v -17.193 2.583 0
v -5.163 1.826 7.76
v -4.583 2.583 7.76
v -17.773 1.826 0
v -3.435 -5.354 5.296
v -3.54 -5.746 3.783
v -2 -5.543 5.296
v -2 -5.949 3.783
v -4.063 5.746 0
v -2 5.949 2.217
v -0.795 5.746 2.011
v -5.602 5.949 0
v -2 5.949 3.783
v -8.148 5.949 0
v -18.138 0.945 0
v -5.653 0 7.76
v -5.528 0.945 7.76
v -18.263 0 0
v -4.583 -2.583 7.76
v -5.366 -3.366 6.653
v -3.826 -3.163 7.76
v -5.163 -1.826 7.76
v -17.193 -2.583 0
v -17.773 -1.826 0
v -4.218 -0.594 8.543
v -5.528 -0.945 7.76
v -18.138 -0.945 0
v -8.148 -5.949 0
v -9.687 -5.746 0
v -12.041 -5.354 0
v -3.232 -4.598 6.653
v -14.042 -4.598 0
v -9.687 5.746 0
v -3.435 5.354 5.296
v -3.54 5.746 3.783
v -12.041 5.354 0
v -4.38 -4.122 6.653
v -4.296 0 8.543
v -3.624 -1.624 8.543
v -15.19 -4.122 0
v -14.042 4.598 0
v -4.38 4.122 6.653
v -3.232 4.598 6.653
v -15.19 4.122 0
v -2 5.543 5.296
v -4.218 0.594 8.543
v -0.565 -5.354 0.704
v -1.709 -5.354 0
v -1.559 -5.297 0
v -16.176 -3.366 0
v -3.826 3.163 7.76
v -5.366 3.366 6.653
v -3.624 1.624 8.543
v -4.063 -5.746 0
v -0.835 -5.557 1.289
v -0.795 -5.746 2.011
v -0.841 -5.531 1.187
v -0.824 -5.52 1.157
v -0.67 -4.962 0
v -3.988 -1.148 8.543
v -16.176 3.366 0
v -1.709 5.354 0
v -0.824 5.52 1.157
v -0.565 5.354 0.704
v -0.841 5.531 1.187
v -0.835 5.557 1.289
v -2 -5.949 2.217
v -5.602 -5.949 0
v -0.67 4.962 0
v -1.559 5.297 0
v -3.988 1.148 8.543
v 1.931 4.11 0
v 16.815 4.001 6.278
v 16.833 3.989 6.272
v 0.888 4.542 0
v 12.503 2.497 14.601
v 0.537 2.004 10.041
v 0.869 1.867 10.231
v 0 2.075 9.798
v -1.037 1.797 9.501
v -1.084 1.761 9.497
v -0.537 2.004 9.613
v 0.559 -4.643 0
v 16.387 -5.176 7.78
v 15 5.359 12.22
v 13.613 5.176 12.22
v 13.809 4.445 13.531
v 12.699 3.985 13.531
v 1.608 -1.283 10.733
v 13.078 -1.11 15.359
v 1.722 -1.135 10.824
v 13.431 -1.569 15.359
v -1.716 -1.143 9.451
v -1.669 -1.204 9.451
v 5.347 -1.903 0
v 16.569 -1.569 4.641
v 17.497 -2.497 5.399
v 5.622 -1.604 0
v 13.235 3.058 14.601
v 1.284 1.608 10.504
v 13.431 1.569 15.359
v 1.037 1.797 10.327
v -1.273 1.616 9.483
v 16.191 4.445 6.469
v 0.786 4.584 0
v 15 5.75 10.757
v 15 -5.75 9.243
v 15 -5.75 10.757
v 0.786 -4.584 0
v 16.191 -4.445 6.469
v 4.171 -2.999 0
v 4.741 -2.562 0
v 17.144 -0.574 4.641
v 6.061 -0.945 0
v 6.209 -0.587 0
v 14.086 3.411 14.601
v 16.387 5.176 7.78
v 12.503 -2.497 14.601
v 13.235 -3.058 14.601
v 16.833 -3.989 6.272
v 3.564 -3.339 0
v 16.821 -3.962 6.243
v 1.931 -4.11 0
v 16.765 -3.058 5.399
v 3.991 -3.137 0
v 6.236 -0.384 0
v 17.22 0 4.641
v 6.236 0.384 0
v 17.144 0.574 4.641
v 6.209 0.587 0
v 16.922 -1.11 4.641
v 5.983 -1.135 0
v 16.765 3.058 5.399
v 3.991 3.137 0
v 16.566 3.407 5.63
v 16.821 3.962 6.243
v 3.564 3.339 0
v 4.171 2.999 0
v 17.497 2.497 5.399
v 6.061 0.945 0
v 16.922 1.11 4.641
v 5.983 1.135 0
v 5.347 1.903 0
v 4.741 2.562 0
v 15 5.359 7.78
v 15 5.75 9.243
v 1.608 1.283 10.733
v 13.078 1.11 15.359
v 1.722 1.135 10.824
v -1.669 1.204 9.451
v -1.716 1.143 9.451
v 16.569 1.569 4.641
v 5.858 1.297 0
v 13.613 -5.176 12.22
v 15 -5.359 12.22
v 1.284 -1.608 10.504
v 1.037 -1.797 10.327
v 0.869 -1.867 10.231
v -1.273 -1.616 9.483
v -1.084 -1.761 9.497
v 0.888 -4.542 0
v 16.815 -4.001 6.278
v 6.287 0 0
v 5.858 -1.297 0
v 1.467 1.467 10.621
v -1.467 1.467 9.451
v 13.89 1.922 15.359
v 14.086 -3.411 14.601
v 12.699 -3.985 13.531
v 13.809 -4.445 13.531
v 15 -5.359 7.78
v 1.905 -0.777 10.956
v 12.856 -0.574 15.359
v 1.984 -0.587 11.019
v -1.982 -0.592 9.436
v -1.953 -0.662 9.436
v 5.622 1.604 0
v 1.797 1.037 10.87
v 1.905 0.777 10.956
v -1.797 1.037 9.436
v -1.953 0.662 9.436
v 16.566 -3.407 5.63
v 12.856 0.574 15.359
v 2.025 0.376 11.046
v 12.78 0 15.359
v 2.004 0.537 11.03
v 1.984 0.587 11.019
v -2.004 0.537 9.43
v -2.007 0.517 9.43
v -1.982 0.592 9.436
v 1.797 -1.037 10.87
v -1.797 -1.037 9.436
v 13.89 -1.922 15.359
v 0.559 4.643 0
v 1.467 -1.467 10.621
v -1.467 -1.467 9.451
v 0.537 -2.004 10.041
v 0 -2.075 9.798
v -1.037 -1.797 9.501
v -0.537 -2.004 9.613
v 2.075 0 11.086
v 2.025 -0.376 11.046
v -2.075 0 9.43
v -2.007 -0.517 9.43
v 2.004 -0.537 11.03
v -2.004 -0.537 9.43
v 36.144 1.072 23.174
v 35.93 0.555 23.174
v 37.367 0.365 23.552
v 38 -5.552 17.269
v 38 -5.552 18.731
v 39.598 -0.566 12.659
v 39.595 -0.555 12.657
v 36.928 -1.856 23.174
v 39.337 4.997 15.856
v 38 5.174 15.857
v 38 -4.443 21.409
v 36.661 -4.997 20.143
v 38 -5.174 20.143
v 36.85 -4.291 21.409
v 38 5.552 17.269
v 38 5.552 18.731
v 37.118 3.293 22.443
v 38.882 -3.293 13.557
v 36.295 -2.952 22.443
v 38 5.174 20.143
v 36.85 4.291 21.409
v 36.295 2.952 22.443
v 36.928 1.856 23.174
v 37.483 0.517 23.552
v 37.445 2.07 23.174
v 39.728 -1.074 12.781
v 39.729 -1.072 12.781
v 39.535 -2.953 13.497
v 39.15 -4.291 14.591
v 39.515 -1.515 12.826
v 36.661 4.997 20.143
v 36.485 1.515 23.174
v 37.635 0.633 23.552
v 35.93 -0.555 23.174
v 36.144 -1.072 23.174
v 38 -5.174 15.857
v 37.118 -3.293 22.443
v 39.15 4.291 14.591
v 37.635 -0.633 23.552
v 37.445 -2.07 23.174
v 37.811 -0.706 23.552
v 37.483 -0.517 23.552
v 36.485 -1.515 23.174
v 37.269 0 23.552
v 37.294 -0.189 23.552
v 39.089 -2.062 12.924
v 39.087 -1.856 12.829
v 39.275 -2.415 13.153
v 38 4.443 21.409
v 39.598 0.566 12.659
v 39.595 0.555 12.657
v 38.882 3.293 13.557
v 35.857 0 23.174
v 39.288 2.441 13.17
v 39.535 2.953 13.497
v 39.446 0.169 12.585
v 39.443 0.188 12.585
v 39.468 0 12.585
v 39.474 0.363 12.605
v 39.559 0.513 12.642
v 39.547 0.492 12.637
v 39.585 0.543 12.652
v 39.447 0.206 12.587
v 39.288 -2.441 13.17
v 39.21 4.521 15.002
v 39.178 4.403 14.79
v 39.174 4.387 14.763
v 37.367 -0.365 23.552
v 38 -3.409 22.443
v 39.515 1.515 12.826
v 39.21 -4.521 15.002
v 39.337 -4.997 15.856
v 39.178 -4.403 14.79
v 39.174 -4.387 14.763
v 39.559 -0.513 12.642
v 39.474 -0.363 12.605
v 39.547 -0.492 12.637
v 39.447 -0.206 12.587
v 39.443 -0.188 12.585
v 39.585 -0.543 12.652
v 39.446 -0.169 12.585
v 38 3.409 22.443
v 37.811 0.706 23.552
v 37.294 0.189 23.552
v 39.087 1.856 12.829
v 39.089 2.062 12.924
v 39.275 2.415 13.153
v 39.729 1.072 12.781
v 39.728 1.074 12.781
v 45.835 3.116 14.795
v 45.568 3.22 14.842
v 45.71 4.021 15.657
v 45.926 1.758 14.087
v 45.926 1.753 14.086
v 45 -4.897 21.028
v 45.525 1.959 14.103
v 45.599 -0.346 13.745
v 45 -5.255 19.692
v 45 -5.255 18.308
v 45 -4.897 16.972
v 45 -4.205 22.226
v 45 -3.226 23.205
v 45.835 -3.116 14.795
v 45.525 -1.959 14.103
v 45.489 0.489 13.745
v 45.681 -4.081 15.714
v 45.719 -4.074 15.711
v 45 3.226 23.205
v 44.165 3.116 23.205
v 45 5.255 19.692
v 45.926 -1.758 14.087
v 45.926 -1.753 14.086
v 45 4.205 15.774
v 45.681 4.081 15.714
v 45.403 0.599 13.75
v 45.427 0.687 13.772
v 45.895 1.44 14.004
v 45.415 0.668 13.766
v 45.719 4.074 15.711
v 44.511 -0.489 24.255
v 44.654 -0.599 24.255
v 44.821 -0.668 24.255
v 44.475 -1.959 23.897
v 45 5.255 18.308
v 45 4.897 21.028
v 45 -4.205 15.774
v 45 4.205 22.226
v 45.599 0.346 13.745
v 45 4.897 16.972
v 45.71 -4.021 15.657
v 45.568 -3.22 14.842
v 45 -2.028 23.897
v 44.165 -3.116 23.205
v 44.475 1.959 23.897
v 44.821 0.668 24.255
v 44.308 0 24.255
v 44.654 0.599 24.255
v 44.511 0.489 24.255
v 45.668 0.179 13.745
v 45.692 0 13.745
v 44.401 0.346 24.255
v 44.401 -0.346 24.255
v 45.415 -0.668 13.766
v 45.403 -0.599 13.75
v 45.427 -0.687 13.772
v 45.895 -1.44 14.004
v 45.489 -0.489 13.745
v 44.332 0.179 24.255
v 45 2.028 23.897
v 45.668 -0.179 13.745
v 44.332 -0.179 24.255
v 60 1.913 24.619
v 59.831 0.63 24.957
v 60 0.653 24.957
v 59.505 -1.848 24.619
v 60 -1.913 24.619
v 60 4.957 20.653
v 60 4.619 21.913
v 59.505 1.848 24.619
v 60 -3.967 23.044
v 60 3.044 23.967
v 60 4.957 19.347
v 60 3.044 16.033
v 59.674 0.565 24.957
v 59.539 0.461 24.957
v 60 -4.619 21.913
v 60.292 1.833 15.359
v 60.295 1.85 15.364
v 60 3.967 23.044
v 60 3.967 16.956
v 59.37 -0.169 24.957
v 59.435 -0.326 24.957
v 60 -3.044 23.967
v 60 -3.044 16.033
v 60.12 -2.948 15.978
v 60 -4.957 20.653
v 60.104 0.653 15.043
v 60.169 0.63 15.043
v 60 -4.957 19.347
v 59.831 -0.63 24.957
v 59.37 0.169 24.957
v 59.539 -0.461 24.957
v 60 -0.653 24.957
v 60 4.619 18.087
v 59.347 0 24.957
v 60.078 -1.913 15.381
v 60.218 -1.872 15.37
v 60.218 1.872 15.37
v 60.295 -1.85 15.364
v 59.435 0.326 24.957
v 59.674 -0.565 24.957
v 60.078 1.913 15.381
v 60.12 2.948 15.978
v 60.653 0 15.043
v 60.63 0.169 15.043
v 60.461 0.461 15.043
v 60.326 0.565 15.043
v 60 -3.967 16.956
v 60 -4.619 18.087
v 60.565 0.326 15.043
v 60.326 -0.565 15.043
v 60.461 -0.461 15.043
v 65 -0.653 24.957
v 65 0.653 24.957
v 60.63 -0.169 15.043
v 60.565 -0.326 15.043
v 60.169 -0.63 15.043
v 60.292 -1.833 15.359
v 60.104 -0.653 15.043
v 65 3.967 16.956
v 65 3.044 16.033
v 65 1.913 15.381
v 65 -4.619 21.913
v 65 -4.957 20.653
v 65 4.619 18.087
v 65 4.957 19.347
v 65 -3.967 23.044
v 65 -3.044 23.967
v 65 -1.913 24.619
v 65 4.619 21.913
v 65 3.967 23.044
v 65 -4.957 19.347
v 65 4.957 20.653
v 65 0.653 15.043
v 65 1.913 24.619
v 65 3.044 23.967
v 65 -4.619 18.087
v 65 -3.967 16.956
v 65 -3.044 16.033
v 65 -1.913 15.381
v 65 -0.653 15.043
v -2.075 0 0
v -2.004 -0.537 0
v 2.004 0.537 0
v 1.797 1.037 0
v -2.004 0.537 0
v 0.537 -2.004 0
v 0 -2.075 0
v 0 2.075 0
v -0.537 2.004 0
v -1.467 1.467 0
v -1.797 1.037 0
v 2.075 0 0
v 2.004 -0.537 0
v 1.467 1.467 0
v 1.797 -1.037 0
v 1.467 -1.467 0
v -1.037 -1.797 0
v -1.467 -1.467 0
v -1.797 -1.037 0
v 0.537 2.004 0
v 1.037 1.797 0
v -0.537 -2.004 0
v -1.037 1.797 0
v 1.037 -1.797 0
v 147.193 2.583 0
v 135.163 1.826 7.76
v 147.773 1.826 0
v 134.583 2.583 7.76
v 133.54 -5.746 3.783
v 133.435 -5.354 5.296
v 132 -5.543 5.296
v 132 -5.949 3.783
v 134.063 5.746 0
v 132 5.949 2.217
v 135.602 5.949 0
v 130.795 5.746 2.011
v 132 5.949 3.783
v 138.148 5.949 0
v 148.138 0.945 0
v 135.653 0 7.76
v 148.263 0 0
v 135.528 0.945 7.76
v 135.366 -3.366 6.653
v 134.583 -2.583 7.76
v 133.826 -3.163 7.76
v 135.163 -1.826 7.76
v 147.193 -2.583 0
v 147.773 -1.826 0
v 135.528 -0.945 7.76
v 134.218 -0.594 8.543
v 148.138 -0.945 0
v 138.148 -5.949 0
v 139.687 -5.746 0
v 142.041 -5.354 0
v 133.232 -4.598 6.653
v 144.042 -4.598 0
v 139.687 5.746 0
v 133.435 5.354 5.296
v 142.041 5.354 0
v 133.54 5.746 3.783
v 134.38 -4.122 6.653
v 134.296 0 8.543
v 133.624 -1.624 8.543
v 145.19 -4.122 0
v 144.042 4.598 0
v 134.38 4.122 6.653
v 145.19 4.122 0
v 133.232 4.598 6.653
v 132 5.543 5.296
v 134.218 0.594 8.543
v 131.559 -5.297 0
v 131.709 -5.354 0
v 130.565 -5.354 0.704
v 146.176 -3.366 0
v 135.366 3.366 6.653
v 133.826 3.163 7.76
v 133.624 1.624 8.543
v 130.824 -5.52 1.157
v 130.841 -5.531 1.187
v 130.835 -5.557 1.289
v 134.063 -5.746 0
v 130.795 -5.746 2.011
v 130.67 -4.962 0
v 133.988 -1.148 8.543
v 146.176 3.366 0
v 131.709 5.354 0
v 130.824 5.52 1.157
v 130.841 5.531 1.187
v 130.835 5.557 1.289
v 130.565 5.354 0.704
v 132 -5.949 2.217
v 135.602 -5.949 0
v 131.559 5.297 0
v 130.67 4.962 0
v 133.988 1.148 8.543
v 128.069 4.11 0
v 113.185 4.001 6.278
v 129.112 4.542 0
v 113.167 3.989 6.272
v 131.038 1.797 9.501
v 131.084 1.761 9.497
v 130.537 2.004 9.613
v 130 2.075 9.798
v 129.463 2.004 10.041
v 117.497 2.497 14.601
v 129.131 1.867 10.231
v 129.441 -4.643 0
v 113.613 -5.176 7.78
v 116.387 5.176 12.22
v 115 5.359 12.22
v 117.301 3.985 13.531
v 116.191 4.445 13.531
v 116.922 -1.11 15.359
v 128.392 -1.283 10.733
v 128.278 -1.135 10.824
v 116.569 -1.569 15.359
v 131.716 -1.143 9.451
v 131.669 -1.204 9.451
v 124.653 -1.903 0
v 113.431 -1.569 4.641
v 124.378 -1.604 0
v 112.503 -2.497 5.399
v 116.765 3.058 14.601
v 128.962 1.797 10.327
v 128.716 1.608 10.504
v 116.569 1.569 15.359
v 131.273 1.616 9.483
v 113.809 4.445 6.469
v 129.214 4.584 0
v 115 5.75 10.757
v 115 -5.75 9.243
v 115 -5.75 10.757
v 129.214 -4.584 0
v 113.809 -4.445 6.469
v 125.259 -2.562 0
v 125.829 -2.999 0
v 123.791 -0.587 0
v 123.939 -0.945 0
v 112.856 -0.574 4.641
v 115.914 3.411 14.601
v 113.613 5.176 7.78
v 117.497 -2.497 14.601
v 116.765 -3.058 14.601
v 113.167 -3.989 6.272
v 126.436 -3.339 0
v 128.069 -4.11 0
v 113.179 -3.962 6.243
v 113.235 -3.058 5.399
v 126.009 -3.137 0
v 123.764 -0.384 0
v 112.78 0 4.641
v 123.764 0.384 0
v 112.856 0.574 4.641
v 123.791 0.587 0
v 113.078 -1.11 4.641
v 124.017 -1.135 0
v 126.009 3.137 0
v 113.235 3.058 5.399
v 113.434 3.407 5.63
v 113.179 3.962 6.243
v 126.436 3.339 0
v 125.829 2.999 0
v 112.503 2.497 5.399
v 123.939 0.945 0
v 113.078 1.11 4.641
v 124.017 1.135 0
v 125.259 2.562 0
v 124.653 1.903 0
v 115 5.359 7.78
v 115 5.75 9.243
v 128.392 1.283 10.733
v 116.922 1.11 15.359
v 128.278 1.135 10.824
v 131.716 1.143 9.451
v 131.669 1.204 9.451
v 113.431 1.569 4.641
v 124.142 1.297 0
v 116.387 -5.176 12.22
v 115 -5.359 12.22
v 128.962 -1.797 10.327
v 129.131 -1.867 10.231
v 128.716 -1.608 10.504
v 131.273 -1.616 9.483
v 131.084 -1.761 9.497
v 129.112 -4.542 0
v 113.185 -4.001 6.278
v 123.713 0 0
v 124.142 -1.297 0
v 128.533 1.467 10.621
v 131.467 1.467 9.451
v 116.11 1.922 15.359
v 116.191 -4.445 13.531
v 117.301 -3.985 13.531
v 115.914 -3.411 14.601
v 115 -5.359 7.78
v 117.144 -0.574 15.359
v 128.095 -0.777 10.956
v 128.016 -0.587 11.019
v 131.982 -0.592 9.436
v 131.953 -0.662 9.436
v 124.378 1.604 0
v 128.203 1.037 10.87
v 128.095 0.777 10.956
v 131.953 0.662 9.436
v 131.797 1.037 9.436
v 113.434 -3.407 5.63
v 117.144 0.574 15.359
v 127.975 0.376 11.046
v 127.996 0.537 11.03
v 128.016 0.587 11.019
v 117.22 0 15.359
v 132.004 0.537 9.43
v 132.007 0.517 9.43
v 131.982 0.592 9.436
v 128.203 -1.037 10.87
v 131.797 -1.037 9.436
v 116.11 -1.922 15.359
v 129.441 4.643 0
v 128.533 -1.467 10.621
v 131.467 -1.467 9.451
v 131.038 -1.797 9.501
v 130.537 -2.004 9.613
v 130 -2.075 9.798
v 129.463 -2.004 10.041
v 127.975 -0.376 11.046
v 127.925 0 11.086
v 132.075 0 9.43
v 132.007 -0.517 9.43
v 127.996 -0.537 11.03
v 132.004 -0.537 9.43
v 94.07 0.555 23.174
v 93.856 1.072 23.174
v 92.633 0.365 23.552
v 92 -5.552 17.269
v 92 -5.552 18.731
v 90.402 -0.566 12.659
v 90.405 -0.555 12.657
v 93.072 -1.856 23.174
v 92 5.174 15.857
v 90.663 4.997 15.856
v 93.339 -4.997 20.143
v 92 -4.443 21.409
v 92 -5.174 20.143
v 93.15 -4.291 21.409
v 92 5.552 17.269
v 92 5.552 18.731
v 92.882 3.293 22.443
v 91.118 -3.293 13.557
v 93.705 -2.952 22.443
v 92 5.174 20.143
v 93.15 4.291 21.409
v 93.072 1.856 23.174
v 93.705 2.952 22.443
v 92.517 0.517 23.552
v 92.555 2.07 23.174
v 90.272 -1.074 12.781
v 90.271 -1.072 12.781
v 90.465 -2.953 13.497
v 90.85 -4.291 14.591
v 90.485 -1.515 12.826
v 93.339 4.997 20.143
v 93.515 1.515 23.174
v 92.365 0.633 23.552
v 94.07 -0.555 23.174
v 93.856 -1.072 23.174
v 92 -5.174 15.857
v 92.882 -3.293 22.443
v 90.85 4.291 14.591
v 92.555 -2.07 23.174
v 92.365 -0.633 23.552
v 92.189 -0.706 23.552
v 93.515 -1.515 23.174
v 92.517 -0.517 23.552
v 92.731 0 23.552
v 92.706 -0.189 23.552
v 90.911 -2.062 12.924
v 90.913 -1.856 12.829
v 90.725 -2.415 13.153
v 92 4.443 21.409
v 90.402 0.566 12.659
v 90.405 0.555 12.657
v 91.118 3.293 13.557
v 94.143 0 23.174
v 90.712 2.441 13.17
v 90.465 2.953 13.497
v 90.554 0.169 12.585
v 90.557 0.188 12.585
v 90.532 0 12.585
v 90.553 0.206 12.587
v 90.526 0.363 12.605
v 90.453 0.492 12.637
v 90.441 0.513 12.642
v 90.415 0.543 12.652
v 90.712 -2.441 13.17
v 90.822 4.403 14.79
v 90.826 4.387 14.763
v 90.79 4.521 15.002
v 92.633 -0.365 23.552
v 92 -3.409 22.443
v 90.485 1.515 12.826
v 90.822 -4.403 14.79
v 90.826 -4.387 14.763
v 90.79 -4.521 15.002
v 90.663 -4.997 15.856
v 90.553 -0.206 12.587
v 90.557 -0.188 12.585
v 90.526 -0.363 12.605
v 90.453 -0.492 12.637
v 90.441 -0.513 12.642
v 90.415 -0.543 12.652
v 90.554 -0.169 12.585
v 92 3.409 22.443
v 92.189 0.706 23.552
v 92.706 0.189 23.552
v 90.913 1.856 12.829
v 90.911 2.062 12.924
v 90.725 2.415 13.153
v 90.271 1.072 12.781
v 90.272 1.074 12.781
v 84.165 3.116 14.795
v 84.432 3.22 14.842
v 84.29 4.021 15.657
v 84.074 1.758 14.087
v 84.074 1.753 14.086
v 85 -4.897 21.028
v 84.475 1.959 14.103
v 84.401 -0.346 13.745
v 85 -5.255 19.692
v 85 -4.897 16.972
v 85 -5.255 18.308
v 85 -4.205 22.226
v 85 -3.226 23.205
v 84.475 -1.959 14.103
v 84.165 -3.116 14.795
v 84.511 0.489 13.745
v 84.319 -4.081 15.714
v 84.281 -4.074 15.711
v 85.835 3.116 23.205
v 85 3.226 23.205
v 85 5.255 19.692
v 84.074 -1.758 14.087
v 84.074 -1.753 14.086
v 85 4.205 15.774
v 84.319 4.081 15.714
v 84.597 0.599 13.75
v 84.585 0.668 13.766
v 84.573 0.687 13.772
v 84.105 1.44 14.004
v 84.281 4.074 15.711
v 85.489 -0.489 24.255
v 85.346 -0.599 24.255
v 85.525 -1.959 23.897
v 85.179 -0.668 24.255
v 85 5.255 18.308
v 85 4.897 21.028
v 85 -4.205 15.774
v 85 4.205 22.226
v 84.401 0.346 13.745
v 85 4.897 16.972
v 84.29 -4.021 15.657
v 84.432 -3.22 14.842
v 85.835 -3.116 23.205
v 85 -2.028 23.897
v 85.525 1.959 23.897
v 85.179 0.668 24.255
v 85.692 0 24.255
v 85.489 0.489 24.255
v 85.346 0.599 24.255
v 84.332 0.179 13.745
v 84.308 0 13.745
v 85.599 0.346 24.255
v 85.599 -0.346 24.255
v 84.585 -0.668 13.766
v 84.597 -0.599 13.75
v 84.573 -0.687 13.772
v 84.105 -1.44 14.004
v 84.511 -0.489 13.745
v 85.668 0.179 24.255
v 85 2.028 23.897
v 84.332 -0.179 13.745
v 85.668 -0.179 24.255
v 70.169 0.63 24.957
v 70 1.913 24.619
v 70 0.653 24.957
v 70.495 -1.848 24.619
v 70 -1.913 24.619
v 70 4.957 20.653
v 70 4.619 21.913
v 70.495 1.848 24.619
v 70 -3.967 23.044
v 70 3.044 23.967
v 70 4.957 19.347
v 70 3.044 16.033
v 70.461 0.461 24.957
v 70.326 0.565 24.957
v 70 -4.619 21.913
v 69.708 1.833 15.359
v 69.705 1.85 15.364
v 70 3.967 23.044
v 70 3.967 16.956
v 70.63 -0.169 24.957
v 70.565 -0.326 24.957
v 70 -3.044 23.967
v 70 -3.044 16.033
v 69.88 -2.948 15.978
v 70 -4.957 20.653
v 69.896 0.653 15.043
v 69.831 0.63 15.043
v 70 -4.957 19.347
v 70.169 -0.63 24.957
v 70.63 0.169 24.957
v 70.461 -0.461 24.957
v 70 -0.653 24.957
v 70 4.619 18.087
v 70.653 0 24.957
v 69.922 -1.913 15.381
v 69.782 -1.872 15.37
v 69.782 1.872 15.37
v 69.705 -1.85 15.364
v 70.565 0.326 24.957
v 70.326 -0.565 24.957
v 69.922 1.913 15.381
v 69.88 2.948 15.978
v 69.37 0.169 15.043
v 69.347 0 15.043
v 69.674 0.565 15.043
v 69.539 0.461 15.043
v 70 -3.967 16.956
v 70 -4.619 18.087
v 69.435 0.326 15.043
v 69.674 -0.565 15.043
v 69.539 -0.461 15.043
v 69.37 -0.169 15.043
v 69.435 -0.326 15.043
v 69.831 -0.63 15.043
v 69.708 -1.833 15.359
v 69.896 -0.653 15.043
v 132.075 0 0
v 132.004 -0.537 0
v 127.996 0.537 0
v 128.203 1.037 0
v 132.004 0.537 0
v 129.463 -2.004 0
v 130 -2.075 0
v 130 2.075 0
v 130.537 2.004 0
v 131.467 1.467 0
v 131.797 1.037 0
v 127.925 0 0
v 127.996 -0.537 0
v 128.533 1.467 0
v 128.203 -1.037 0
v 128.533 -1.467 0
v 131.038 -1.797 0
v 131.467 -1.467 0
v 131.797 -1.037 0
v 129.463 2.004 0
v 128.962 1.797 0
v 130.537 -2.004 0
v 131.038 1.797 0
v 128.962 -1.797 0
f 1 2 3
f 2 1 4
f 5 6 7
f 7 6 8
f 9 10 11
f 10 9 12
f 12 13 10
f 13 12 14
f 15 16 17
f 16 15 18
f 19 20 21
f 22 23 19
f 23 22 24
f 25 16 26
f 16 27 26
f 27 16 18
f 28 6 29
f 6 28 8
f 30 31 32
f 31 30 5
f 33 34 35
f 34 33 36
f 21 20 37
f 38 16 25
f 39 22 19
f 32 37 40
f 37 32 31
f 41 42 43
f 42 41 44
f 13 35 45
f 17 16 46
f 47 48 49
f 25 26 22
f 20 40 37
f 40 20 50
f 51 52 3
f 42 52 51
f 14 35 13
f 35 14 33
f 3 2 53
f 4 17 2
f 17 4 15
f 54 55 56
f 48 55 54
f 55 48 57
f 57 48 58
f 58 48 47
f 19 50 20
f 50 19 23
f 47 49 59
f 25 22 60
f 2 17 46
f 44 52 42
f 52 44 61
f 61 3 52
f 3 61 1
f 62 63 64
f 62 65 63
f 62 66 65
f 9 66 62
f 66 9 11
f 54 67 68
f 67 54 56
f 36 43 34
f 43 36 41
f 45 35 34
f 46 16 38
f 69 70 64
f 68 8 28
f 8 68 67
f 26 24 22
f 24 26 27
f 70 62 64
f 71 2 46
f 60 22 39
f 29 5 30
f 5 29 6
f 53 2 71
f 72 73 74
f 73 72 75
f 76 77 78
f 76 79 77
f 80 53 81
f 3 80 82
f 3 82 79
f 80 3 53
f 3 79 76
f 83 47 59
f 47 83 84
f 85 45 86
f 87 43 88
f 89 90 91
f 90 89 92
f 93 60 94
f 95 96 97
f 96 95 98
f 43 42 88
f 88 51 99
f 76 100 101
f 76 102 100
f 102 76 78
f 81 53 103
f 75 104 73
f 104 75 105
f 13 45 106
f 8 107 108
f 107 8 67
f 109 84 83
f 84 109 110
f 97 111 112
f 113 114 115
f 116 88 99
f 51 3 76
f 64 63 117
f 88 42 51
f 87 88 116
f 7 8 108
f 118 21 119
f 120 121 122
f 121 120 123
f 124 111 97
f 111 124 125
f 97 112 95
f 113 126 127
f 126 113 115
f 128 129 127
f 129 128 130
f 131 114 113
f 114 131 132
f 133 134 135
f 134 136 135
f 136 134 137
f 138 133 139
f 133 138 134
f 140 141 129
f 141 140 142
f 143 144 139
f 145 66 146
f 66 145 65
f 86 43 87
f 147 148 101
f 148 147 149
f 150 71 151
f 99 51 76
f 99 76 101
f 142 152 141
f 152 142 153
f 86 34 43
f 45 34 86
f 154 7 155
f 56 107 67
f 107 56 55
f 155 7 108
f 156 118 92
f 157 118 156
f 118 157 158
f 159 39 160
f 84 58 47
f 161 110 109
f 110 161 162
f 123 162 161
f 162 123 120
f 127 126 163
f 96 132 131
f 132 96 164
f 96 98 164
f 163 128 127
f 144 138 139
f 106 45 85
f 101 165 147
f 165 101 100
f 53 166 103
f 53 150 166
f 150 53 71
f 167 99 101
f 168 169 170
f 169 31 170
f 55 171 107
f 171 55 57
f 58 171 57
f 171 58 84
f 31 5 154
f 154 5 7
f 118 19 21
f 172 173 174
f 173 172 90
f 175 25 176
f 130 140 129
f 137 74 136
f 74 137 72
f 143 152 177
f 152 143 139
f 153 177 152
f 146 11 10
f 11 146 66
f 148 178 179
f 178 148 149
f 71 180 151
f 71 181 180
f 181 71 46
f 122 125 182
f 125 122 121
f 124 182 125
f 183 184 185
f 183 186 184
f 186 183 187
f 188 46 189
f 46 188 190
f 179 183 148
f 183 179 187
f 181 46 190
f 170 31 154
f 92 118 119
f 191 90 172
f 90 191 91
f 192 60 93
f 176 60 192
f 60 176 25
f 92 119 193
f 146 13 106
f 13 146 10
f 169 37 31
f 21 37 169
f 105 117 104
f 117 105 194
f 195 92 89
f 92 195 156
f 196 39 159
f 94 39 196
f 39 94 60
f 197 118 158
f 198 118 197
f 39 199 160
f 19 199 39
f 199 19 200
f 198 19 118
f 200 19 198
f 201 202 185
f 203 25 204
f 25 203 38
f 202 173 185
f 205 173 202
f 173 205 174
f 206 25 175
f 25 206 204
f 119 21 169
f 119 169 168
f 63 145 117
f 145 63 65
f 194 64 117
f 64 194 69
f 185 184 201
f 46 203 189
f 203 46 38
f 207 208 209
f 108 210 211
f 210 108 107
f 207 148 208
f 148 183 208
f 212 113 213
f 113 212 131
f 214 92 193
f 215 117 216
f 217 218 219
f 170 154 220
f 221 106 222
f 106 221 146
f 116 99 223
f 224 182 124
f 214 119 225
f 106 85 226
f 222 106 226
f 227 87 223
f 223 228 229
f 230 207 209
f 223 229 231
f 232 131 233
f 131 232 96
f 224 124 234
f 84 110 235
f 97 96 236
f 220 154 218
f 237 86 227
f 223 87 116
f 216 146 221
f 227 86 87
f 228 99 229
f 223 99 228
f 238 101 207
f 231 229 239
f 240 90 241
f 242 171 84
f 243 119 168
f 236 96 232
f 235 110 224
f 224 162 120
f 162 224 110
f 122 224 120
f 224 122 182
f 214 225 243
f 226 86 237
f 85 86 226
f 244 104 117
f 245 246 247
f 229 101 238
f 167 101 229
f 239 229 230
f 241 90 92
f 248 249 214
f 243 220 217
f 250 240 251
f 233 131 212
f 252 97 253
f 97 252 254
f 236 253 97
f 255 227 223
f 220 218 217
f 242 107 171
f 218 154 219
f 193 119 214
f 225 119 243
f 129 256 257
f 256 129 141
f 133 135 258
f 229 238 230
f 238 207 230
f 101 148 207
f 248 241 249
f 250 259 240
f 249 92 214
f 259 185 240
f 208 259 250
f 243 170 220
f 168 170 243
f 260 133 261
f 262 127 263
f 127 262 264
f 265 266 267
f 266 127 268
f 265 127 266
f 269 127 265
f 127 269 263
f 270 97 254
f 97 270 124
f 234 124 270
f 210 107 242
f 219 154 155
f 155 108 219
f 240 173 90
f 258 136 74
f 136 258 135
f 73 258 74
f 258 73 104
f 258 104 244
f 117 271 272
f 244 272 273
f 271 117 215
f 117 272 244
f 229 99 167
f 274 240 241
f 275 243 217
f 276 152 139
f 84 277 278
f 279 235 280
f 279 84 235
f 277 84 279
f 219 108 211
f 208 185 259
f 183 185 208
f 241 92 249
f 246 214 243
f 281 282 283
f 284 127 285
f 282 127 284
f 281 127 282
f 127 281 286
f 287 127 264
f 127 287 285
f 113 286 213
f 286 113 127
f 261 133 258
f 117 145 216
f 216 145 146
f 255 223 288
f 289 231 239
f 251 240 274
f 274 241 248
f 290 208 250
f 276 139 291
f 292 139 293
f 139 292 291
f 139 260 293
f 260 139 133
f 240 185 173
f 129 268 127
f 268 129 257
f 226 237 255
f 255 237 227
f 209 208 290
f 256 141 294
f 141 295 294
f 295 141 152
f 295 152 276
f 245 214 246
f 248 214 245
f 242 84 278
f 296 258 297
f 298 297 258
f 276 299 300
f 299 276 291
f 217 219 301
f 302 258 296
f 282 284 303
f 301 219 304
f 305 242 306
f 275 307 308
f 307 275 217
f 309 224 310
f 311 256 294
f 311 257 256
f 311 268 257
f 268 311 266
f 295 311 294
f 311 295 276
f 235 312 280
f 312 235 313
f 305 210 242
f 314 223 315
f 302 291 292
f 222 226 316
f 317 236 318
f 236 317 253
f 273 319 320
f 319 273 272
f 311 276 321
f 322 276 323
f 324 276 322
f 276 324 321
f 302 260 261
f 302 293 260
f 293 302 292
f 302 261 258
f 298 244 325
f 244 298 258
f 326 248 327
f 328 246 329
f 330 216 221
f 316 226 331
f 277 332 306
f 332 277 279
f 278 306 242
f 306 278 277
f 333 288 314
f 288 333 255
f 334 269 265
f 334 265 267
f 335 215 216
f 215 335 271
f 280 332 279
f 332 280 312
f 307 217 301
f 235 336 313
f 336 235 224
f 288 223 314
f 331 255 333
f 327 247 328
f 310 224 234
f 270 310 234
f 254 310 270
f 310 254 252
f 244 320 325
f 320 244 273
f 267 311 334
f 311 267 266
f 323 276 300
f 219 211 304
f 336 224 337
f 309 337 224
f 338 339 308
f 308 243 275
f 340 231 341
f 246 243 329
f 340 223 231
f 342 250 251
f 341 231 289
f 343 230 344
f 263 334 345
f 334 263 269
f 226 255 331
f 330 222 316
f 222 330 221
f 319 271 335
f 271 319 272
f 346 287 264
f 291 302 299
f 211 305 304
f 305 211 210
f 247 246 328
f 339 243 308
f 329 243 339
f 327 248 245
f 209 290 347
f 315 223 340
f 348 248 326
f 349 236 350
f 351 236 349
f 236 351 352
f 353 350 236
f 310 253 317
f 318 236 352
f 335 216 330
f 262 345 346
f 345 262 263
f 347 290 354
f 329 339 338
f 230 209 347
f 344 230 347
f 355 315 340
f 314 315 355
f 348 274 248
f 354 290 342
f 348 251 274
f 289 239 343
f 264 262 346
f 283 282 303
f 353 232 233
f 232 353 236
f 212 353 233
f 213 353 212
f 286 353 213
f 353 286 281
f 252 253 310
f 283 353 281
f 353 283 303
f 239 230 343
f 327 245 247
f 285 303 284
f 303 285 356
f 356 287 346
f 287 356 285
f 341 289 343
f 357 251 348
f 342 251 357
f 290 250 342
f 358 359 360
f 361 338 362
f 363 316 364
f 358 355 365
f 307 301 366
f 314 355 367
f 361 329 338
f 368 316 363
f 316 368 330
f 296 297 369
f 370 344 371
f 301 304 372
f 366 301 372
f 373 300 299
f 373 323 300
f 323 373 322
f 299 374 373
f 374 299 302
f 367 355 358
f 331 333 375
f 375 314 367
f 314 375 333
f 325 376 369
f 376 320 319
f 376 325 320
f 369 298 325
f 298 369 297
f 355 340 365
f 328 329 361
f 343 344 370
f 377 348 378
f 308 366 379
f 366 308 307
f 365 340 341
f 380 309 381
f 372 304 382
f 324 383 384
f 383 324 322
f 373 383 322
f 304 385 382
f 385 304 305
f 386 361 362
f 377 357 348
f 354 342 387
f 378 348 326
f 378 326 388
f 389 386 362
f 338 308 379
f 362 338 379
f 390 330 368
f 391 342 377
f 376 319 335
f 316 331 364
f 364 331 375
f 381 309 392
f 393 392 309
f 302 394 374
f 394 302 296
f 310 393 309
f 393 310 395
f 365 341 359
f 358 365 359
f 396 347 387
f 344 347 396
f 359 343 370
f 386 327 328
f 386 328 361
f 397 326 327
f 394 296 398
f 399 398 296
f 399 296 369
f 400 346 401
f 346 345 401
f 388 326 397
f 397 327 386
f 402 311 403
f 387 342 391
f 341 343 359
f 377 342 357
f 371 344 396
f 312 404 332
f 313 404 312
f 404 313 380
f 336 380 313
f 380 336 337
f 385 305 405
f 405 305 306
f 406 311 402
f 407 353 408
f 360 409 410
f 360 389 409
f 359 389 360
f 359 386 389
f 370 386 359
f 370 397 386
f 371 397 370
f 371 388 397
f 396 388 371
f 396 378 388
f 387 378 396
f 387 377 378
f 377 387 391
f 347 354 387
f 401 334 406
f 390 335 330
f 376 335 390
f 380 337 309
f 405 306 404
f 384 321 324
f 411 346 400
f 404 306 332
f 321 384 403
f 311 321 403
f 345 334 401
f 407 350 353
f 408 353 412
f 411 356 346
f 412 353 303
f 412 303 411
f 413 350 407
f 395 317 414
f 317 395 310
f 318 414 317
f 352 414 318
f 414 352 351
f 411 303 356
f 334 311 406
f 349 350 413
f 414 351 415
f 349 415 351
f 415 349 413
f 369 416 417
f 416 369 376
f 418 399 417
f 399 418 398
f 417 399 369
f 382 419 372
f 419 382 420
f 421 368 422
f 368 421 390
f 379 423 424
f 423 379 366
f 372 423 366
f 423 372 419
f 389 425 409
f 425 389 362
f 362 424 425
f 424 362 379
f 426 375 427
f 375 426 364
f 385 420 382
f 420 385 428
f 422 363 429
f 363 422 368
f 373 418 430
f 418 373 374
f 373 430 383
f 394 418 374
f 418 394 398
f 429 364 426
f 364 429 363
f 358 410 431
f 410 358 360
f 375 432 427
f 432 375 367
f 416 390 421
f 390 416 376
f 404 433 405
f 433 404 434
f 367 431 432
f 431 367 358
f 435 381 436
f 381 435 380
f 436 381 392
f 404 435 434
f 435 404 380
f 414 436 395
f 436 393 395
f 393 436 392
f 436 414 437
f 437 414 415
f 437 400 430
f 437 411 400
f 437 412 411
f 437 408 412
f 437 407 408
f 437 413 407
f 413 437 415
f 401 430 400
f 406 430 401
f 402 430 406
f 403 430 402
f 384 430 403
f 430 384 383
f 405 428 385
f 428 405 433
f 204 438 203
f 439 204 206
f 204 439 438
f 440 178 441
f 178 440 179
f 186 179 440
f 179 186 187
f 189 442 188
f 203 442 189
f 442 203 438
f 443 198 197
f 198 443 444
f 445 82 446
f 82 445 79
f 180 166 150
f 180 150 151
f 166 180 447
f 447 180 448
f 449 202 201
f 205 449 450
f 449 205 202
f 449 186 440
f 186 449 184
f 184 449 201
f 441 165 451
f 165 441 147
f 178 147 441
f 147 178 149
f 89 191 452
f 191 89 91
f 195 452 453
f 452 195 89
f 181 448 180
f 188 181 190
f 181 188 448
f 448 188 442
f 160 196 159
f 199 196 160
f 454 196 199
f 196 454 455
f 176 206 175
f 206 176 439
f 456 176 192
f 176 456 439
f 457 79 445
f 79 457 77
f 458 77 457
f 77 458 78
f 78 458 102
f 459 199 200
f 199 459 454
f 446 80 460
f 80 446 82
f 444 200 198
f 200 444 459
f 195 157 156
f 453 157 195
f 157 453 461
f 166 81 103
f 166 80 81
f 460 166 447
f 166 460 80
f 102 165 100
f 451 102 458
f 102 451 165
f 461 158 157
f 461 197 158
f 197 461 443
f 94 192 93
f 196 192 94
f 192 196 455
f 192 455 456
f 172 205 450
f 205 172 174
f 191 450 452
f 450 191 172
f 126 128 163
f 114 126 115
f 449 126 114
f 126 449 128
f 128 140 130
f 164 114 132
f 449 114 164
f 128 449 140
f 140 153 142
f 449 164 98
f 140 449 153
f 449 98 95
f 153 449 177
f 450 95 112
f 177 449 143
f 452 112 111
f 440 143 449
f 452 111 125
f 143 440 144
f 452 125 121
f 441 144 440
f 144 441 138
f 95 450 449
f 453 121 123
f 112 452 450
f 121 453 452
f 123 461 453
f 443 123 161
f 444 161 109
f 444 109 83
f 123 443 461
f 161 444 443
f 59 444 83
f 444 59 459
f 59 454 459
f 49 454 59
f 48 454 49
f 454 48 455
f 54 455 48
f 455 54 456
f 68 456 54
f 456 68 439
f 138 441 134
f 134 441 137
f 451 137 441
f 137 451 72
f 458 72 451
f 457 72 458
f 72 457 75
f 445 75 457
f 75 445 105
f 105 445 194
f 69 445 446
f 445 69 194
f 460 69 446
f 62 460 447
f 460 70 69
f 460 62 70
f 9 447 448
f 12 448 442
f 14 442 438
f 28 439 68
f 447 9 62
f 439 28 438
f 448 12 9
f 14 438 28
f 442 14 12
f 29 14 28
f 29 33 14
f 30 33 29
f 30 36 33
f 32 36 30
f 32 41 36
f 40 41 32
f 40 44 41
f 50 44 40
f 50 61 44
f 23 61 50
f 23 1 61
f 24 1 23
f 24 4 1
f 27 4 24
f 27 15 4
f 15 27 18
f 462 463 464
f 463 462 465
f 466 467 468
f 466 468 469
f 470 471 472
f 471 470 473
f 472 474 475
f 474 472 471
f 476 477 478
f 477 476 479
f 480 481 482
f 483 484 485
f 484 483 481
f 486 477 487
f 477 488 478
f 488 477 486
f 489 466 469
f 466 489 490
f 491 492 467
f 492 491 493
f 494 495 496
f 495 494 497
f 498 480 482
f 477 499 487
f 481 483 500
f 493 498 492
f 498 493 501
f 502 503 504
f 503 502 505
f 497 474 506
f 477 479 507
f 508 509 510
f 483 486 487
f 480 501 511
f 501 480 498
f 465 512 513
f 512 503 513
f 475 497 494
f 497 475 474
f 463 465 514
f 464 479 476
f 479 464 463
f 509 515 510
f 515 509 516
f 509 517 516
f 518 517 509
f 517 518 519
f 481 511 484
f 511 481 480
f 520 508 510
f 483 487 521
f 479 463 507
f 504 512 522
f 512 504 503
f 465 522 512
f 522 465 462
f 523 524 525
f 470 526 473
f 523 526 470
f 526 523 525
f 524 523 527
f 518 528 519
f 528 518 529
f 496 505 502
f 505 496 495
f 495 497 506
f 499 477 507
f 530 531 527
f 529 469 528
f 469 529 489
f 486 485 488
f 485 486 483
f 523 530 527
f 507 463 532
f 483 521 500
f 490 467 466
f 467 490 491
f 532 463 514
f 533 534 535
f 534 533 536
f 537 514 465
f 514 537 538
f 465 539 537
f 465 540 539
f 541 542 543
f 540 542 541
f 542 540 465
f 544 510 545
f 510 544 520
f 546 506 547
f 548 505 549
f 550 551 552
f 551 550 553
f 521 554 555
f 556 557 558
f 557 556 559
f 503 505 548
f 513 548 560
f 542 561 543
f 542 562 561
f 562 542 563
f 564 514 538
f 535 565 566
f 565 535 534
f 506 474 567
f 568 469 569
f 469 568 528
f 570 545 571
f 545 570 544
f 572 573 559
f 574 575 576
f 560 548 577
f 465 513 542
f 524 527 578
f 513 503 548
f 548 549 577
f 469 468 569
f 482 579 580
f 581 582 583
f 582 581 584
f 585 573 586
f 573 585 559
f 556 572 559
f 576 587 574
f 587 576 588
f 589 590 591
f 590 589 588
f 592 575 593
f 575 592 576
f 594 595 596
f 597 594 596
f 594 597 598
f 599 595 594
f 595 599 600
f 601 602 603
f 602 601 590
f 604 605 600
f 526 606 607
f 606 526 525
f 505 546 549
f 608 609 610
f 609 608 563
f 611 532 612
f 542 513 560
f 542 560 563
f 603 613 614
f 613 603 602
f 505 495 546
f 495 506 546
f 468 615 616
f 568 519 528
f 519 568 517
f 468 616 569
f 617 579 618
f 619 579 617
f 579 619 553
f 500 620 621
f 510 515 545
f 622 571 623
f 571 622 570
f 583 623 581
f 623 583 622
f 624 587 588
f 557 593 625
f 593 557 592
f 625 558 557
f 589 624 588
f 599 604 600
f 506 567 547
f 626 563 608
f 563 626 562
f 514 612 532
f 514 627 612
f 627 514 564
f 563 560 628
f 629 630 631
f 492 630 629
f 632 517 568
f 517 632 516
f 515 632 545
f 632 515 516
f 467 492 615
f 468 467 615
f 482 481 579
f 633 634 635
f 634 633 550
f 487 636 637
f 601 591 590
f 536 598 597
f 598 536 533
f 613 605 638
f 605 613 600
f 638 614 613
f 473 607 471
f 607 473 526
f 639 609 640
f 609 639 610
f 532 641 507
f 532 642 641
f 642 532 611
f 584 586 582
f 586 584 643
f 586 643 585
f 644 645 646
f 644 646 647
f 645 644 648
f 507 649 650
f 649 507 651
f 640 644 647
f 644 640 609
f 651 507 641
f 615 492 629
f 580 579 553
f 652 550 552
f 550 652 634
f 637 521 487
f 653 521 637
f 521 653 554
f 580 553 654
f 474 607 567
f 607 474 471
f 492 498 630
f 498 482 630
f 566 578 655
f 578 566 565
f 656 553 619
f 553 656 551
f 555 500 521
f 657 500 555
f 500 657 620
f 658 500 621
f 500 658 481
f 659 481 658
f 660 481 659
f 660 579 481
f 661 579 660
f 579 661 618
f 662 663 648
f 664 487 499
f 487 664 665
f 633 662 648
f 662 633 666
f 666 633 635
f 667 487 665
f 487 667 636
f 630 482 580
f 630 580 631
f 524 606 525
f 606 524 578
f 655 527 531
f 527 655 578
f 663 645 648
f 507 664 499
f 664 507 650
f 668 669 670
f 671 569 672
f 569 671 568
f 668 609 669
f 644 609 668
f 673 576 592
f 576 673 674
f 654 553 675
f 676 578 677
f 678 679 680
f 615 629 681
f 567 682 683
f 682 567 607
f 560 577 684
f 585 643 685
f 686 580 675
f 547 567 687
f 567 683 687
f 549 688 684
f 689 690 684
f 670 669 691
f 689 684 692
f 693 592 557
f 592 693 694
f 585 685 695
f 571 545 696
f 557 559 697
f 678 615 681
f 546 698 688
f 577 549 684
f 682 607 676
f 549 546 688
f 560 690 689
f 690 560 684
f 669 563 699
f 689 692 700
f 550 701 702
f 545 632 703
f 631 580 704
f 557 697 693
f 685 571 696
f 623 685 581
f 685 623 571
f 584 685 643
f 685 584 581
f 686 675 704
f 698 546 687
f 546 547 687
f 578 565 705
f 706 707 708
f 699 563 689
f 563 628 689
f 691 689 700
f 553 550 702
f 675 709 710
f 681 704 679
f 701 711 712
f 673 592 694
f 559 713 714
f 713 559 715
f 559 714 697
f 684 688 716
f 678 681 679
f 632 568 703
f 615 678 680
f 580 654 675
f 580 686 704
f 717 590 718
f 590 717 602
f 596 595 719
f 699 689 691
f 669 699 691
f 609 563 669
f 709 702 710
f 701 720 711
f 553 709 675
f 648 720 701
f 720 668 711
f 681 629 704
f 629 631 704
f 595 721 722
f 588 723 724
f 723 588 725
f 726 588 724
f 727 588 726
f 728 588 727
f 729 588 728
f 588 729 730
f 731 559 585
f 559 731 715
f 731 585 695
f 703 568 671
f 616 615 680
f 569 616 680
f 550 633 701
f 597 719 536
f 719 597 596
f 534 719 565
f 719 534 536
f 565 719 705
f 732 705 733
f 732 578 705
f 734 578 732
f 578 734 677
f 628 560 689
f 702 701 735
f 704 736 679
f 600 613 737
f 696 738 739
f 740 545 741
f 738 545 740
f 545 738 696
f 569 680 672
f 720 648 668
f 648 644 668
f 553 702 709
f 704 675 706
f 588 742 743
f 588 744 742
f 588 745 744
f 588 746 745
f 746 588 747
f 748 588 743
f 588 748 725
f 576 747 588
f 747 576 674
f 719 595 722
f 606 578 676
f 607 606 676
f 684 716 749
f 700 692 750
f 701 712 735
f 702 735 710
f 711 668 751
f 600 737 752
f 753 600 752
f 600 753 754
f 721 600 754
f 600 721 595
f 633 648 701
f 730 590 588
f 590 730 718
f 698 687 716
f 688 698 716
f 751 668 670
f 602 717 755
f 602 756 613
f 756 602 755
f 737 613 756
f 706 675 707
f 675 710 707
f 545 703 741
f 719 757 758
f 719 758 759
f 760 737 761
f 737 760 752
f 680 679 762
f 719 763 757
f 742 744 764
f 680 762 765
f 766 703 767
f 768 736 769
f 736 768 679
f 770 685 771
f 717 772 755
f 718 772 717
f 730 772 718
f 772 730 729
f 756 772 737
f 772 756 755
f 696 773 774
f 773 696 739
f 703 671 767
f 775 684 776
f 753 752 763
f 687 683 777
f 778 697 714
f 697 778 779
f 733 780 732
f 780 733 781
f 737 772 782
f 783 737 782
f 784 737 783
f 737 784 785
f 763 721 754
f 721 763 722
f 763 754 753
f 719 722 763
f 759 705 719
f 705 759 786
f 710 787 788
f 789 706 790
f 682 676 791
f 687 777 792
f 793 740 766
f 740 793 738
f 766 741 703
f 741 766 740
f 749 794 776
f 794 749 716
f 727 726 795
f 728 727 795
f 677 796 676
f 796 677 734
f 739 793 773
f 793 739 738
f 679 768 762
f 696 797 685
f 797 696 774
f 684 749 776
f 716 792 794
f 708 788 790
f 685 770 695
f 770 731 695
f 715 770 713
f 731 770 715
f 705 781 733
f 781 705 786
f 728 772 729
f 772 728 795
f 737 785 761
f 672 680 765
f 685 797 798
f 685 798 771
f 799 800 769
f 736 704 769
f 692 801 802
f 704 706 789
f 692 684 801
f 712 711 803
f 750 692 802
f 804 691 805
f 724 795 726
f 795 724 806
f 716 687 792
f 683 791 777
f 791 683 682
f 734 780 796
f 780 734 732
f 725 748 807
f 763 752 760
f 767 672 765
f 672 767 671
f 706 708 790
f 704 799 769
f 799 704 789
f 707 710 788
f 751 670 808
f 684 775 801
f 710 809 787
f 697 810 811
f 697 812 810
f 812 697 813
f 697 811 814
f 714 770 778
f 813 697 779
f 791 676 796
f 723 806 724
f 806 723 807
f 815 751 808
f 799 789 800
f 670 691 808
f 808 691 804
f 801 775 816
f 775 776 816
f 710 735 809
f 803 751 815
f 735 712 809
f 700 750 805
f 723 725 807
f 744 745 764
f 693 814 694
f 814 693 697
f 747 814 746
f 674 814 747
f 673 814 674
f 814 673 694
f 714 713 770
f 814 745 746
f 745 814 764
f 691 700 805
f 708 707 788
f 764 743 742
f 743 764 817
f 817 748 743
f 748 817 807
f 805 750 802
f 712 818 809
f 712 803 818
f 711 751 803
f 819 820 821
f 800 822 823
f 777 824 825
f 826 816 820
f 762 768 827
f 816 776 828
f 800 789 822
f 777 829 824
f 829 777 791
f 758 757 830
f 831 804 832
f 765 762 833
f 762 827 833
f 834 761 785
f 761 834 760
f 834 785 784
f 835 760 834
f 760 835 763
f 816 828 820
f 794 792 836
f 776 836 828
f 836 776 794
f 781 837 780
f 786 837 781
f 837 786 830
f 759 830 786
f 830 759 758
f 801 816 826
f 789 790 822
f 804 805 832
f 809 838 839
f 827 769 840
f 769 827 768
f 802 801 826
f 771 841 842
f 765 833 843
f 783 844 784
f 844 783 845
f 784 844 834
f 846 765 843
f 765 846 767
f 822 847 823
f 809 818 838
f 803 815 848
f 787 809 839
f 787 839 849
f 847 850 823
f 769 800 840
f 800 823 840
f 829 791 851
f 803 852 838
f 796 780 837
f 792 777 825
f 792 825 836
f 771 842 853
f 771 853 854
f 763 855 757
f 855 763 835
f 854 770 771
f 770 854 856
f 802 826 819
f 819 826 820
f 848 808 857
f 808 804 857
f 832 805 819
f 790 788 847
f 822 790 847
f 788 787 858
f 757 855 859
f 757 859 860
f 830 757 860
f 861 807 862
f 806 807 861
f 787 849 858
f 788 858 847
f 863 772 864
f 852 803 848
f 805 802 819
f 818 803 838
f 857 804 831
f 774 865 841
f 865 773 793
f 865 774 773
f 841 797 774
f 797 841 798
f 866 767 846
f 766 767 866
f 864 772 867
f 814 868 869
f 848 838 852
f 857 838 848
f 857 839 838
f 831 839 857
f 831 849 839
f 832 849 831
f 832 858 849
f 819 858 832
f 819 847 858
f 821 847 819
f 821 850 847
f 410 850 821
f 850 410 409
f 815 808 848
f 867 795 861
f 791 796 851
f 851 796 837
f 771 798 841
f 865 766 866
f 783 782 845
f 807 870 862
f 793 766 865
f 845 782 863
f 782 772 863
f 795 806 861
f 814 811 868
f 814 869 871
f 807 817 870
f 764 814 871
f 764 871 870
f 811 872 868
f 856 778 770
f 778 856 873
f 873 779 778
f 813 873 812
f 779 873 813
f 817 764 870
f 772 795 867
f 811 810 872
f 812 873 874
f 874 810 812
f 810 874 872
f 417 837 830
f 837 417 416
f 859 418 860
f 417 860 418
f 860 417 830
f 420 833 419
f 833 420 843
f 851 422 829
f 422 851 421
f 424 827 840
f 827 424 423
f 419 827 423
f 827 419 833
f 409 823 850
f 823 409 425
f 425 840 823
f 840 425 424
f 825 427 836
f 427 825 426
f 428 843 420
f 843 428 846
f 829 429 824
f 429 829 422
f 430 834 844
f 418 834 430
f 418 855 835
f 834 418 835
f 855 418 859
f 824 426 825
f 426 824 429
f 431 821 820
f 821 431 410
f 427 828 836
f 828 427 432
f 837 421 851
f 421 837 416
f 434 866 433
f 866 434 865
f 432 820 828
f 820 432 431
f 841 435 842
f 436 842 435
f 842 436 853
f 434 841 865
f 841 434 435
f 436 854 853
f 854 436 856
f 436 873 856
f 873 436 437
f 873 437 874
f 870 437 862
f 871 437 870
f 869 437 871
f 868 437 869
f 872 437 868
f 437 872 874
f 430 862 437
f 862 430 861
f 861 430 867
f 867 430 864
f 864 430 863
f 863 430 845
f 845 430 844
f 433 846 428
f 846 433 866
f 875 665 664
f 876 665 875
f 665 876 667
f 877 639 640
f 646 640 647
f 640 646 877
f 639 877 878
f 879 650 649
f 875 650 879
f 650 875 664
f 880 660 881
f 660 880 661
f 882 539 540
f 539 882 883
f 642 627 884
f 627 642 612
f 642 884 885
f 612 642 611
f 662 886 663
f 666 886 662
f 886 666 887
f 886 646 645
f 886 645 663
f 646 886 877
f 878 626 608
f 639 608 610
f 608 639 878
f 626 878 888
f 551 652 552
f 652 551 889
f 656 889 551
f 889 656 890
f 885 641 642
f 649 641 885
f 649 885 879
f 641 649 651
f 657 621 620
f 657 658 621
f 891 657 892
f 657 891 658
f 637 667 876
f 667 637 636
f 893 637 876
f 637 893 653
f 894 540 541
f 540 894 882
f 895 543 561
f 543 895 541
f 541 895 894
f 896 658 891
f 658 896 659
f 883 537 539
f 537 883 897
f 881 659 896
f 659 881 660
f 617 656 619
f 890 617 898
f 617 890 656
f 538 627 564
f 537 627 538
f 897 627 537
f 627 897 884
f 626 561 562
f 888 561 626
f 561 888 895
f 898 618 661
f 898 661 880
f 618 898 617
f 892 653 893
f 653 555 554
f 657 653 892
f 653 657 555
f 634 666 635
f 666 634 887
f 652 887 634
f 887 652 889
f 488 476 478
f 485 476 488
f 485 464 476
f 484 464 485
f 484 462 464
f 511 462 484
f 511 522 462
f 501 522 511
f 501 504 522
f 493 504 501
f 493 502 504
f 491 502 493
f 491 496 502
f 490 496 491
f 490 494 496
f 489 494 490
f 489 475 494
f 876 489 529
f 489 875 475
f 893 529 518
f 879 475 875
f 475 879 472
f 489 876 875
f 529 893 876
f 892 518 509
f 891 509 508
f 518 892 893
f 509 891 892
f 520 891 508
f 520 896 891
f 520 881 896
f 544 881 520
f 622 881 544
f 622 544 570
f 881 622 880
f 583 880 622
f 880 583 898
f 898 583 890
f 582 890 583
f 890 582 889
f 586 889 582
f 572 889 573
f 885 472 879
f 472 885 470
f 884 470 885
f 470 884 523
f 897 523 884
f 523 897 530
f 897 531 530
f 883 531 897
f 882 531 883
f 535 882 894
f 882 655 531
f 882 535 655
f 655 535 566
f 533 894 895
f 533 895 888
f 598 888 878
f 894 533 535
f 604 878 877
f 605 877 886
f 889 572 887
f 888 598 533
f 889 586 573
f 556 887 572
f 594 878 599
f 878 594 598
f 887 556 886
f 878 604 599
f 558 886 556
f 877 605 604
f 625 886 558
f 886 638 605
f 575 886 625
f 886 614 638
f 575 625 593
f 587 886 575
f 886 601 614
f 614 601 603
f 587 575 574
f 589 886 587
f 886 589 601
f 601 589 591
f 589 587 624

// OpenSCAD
module dualSphereHull(t1,r1,t2,r2,nothing) {
  hull(){
    translate(t1)
      sphere(r1);
    
    translate(t2)
      sphere(r2);
  }
}

module halfHandle() {
  difference(){
    union() {
      dualSphereHull(
        [-15,0,-5], 6,
        [-2,0,3], 6,
        123456
      );

      dualSphereHull(
        [-2,0,3], 6,
        [15,0,10], 5.8,
        123456
      );

      
      dualSphereHull(
        [15,0,10], 5.8,
        [38,0,18], 5.6,
        123456
      );
      
      dualSphereHull(
        [38,0,18], 5.6,
        [45,0,19], 5.3,
        123456
      );
      
      dualSphereHull(
        [45,0,19], 5.3,
        [60,0,20], 5,
        123456
      );
      
      dualSphereHull(
        [60,0,20], 5,
        [65,0,20], 5,
        123456
      );
    }
    
    $fn=24;  
    translate([0,0,-30])
      cylinder(r=(3.85+.3)/2, h=60);
    
    // lower plane
    translate([-200,-200,-20])
      cube([400,400,20]);
    
    // side plane -- used to cut the half handle
    // 2 x half-handle should join exactly at that plane
    translate([65,-100,-20])
      cube([200,200,400]);
  }
}

union() {
  halfHandle();

  translate([130,0,0])
  mirror([1,0,0])
  halfHandle();
}
